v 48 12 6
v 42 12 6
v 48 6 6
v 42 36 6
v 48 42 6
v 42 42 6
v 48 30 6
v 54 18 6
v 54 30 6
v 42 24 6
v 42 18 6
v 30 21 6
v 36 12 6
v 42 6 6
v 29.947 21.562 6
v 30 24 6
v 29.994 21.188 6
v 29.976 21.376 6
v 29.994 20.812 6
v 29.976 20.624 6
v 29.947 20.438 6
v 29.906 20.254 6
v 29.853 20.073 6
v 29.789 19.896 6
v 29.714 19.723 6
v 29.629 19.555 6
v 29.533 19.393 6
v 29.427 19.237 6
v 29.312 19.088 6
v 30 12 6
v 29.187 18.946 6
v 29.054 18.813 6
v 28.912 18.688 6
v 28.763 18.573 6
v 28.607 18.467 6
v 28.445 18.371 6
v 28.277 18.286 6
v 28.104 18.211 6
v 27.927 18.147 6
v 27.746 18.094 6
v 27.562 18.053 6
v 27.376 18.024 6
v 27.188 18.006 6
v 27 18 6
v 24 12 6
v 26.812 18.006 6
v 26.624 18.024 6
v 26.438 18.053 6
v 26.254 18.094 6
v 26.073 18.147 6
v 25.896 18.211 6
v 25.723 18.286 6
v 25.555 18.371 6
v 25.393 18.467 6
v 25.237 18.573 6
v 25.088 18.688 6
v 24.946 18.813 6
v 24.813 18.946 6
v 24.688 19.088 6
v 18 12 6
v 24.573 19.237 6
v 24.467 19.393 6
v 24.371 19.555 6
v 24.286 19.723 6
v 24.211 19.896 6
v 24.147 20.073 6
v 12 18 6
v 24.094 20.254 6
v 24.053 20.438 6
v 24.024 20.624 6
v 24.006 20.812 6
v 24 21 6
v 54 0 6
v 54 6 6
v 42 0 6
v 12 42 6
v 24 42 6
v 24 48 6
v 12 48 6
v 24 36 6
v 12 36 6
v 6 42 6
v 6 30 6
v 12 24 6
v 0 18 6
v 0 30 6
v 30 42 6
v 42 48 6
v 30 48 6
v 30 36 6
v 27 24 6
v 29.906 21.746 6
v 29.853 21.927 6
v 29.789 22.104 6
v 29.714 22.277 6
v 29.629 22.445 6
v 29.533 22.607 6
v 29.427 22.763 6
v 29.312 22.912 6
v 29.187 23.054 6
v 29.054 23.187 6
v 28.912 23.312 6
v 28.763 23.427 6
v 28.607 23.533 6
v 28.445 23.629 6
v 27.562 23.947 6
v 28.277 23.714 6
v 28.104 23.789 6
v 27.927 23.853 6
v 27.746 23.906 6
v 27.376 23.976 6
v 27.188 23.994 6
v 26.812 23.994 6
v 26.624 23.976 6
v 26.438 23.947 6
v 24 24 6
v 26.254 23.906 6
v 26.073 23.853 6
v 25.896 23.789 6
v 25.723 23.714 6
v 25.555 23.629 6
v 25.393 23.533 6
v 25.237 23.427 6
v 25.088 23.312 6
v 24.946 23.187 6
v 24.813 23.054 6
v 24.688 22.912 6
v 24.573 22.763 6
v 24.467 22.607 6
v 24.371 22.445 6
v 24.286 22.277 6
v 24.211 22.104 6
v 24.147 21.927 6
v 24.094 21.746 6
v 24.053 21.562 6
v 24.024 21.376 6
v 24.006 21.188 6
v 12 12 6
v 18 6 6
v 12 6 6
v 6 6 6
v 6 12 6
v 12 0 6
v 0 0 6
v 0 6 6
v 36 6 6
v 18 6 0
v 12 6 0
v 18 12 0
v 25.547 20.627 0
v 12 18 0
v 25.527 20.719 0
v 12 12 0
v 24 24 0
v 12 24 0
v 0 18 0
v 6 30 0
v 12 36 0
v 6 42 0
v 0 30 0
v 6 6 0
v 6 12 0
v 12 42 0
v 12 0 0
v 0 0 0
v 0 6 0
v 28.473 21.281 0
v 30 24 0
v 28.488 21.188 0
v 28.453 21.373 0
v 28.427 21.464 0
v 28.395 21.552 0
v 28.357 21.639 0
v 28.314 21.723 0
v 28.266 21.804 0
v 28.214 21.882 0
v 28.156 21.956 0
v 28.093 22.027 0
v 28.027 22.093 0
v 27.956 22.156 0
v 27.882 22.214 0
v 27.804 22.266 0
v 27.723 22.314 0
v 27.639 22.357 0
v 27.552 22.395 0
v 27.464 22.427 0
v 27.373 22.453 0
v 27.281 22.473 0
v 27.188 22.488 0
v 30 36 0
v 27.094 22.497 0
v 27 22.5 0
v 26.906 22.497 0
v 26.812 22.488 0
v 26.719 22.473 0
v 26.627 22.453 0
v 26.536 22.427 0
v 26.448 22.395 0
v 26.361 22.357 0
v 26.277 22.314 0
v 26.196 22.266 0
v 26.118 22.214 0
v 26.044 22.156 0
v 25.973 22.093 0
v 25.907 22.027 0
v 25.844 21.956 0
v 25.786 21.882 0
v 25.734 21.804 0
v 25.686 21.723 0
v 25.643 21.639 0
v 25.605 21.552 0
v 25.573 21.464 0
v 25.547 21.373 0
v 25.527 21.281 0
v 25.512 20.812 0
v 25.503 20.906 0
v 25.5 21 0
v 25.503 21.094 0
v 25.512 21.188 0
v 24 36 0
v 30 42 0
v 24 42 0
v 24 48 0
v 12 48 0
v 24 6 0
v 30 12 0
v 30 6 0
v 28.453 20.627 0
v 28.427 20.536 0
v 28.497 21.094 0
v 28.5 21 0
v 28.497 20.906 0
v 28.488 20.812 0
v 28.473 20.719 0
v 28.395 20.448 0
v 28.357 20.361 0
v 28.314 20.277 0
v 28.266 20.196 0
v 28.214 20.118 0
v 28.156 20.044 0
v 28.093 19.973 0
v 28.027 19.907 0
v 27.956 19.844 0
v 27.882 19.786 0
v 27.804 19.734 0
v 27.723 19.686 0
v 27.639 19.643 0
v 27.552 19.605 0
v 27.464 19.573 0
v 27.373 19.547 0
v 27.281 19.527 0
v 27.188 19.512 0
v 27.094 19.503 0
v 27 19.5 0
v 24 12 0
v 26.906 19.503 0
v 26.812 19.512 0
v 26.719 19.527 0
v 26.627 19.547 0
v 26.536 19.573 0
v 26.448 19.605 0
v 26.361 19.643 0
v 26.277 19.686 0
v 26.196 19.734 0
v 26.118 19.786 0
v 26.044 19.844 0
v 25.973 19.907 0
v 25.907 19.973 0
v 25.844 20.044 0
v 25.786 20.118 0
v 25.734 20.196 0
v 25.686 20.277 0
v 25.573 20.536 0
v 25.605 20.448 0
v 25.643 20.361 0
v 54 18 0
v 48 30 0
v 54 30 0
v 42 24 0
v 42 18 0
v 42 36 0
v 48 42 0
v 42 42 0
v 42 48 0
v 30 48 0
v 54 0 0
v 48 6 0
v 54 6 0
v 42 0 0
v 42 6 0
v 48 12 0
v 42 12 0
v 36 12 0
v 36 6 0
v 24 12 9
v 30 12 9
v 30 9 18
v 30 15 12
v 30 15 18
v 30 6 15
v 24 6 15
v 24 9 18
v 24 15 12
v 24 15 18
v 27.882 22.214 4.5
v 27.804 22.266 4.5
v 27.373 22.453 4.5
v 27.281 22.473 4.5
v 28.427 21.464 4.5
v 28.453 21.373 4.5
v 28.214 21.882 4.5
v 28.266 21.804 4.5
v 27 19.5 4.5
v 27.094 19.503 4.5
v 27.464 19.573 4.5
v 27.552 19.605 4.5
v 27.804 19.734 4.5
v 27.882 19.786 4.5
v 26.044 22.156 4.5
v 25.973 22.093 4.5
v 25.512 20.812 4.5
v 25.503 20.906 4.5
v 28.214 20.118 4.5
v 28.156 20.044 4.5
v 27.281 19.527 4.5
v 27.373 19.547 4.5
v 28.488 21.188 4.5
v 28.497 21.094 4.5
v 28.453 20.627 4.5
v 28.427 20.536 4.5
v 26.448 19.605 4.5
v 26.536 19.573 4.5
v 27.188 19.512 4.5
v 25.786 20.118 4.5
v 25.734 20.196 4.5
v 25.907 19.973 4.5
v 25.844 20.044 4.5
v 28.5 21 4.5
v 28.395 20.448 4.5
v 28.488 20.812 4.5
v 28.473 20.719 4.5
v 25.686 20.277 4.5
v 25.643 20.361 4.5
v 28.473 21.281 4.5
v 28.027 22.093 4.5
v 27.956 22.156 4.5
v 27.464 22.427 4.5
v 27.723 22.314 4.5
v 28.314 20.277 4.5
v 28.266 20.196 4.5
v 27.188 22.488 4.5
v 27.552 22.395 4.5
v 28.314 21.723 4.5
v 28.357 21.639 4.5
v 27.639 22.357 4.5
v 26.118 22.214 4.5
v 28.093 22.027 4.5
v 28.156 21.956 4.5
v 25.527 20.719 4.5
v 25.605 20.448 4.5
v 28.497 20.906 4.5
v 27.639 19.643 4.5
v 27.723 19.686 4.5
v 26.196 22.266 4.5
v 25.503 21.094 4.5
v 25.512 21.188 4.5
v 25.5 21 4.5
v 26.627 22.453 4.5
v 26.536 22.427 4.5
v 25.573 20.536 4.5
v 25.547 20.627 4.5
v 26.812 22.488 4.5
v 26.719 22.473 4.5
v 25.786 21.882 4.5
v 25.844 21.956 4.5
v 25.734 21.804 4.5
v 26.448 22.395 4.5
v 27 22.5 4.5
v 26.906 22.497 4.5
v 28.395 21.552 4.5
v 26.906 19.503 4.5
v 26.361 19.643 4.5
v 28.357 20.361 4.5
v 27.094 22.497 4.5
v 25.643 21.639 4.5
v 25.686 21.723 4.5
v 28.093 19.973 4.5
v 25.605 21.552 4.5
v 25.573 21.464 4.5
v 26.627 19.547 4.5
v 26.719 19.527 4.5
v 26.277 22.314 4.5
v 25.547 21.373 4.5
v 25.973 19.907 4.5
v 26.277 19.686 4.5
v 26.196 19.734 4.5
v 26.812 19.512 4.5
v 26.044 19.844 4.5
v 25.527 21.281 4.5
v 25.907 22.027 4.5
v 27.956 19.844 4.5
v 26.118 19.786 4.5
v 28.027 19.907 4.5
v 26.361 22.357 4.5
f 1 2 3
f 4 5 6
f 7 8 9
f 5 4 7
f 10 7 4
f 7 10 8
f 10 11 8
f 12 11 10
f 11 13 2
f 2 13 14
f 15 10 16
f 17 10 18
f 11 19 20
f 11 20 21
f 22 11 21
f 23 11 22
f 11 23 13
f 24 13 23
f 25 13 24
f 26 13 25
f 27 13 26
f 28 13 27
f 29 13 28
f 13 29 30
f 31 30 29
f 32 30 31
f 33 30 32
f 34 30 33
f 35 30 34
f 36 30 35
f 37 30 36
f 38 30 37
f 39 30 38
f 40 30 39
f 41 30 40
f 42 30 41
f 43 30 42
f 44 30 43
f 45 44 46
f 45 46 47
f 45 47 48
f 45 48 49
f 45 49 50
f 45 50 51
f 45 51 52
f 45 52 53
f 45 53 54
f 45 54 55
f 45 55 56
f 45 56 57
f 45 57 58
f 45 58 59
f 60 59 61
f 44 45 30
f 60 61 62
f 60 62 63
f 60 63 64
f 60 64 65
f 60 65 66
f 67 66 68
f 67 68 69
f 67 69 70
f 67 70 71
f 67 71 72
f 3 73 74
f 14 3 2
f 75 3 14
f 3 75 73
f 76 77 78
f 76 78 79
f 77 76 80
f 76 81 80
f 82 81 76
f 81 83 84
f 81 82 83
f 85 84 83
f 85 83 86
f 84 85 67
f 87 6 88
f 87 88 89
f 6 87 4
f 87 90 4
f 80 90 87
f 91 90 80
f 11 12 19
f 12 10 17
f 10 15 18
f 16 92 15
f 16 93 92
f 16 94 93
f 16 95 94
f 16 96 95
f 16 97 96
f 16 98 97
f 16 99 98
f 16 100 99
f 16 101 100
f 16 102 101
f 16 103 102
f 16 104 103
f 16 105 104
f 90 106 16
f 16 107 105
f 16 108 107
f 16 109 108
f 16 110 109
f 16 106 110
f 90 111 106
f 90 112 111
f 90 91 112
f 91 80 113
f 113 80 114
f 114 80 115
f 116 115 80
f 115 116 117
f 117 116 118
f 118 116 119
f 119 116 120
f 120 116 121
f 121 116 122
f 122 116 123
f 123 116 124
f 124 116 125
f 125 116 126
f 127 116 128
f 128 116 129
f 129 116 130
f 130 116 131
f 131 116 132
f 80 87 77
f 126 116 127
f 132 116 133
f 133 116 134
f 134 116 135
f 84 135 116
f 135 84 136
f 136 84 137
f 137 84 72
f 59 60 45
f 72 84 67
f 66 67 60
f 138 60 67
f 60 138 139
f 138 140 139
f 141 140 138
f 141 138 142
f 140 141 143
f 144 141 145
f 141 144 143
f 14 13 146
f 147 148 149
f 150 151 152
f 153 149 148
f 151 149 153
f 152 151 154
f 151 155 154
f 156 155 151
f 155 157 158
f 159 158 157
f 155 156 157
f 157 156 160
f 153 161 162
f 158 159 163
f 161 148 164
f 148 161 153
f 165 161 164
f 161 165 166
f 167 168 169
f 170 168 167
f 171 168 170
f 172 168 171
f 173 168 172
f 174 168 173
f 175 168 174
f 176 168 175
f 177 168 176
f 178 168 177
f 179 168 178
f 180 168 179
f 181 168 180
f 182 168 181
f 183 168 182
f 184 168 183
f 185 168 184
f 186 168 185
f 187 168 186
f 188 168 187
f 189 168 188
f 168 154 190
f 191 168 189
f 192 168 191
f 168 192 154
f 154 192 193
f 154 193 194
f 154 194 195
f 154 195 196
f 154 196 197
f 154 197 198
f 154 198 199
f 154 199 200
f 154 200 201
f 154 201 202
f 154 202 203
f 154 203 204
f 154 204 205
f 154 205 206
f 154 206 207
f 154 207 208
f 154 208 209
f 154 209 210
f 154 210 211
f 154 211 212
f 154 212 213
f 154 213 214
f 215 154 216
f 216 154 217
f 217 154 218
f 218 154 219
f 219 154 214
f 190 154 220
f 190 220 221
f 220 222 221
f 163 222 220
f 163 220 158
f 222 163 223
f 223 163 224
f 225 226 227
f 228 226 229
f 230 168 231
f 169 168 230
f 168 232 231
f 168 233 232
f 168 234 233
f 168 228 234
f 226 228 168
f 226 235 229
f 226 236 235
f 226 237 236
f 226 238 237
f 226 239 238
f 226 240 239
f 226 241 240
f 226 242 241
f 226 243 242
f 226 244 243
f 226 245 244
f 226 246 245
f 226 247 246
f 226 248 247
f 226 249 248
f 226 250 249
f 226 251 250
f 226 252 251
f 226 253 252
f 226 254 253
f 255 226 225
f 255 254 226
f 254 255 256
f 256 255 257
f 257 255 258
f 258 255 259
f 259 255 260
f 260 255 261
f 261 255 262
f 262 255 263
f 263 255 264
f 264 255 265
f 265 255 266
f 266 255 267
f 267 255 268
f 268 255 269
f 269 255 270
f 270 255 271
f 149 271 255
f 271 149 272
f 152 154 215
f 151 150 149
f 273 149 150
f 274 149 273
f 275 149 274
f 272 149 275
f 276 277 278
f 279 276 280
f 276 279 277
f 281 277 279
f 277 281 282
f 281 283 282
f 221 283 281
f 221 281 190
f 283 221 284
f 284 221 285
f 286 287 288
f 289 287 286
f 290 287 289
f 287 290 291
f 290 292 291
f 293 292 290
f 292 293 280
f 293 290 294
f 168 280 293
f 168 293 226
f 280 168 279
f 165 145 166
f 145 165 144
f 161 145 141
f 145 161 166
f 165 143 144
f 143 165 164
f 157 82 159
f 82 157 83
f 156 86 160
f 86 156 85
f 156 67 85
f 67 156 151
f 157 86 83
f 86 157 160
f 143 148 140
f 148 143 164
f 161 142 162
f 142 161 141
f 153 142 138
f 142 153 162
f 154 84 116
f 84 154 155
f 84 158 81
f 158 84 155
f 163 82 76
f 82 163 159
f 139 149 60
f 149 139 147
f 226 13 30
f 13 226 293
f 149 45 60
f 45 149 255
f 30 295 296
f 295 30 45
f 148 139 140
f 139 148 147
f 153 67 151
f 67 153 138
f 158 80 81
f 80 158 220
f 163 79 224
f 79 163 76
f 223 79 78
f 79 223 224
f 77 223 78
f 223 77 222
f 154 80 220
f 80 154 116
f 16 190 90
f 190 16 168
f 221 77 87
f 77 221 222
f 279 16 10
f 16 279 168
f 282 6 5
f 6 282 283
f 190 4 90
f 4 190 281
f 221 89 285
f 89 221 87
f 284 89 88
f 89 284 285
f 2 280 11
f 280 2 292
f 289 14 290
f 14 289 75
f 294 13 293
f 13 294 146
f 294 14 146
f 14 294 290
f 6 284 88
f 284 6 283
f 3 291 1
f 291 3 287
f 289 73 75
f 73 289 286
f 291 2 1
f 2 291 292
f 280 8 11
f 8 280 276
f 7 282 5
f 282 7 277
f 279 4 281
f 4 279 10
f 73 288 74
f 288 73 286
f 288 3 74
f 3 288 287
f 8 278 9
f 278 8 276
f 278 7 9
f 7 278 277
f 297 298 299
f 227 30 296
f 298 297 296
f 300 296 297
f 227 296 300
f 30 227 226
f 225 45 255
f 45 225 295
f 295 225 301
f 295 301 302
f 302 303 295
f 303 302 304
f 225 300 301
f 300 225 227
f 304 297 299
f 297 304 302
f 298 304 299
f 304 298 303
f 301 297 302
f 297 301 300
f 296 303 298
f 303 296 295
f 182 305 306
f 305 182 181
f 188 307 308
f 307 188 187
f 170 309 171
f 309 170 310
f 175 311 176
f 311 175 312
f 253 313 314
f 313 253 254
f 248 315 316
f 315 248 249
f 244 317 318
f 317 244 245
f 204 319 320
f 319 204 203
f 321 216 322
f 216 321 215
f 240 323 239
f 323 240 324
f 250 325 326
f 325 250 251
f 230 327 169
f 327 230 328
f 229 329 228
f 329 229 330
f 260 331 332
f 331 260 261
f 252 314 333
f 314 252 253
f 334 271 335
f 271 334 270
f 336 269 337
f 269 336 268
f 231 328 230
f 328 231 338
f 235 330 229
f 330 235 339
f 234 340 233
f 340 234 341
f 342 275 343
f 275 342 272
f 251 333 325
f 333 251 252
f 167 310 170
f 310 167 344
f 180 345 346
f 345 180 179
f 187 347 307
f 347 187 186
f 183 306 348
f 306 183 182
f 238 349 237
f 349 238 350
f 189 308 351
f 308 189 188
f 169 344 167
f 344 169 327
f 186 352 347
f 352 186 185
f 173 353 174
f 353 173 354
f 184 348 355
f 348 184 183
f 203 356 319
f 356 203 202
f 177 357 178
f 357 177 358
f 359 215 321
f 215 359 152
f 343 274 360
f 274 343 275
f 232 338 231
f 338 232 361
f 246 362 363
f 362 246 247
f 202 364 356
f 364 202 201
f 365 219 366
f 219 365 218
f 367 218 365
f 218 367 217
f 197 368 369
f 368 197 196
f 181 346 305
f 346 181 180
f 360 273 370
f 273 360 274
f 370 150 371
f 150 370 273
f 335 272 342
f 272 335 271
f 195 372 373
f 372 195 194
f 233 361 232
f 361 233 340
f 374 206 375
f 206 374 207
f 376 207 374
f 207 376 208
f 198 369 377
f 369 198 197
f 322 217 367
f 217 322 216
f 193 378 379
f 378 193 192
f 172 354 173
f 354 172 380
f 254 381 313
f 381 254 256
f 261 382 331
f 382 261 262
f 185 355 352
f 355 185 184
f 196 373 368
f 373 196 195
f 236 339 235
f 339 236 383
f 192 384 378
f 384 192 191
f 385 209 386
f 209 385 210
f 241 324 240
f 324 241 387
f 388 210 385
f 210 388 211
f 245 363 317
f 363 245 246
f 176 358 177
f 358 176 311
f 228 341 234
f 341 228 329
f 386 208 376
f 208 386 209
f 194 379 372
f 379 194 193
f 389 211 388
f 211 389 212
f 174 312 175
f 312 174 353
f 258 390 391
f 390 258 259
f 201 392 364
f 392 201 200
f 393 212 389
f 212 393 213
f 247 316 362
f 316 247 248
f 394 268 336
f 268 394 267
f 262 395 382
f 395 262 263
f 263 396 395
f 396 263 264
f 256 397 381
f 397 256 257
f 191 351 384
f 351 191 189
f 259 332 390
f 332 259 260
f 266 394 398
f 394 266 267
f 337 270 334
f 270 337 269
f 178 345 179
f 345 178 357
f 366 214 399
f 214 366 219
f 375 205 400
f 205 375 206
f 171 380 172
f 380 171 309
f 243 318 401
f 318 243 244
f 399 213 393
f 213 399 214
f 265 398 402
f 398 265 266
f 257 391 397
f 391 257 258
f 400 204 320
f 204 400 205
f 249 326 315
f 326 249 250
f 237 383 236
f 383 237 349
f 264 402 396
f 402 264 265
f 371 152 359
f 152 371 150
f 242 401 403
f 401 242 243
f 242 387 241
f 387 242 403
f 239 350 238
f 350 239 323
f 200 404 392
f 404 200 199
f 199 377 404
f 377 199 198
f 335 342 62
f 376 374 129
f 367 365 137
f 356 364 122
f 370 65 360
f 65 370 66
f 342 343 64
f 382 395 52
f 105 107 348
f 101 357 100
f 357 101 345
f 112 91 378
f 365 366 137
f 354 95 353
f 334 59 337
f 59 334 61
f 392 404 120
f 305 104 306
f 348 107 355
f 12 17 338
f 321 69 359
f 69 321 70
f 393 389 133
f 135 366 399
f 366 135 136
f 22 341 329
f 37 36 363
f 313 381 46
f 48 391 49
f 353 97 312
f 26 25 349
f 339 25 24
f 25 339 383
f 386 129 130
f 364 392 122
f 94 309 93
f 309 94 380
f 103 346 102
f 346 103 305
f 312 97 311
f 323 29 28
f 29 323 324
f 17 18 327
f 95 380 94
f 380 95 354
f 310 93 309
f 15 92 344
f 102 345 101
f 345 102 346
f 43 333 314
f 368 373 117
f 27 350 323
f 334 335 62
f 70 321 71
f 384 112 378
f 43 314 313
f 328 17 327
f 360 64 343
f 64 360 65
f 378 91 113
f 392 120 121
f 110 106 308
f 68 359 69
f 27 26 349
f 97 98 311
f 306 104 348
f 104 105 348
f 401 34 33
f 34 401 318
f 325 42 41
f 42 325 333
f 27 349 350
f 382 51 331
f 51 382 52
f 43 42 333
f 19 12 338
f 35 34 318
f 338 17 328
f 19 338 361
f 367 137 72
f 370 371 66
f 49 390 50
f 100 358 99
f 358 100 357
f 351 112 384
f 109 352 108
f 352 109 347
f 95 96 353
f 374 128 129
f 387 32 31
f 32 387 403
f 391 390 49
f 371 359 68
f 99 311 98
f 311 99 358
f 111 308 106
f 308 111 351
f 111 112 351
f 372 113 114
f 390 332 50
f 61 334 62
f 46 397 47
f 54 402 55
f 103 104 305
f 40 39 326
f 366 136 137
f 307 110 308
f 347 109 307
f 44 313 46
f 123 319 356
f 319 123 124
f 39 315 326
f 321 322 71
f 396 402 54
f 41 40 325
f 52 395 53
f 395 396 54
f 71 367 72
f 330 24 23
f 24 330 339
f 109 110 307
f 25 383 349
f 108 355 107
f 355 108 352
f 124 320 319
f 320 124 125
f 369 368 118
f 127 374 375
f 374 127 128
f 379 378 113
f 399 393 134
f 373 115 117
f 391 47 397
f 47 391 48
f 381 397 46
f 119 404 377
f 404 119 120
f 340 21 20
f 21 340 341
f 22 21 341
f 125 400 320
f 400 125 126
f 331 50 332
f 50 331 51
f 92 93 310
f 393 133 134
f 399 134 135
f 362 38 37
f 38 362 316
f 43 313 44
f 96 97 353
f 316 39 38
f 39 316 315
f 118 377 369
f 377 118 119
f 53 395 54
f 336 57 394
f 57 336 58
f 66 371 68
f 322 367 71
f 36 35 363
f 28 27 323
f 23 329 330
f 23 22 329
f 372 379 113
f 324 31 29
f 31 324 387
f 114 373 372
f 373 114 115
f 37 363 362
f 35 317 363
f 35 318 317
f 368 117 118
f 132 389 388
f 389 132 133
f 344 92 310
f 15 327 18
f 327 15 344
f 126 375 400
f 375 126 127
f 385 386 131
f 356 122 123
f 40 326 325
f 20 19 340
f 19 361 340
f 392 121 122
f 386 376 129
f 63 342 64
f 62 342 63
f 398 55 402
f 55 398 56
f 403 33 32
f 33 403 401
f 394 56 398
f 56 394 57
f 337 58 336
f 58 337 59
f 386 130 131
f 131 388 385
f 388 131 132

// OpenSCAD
/* 
 * 
 *
 */

$fn=100;

// ------------------------------------------------------------------
// --- parameter ----------------------------------------------------
// ------------------------------------------------------------------

// resolution
$fn=100;

// edge length of one cube that builds the space invader
edgeLength=6;

// radius of the holes
wholeRadius=1.5;


// ------------------------------------------------------------------
// --- space invader versions ---------------------------------------
// --- a vector of 2d coordinates -----------------------------------
// ------------------------------------------------------------------

sp1=[[0,0],[0,1],[0,2],[1,2],[1,3],[1,4],[2,1],[2,2],[2,4],[2,5],[3,2],[3,3],[3,4],[4,1],[4,2],[4,4],[4,5],[5,2],[5,3],[5,4],[6,0],[6,1],[6,2]];

sp2=[[0,0],[0,1],[0,2],[1,2],[1,3],[1,4],[2,1],[2,2],[2,4],[2,5],[3,-1],[3,0],[3,1],[3,2],[3,3],[3,4],[4,1],[4,2],[4,4],[4,5],[5,2],[5,3],[5,4],[6,0],[6,1],[6,2]];

sp3=[[0,-1],[0,0],[0,1],[0,2],[1,-1],[1,2],[1,3],[1,4],[2,1],[2,2],[2,4],[2,5],[3,-1],[3,0],[3,1],[3,2],[3,3],[3,4],[4,1],[4,2],[4,4],[4,5],[5,-1],[5,2],[5,3],[5,4],[6,-1],[6,0],[6,1],[6,2]];

sp4=[[0,0],[0,3],[0,4],[1,0],[1,1],[1,3],[1,4],[1,5],[1,6],[2,1],[2,2],[2,3],[2,6],[2,7],[3,2],[3,3],[3,6],[3,7],[4,2],[4,3],[4,4],[4,5],[4,6],[5,2],[5,3],[5,6],[5,7],[6,1],[6,2],[6,3],[6,6],[6,7],[7,0],[7,1],[7,3],[7,4],[7,5],[7,6],[8,0],[8,3],[8,4]];


// ------------------------------------------------------------------
// --- programm -----------------------------------------------------
// ------------------------------------------------------------------

invader4();


// ------------------------------------------------------------------
// --- invader modules ----------------------------------------------
// ------------------------------------------------------------------


module invader1() {
	_invader(sp1, [3,2], [3,4]);
}

module invader2() {
	_invader(sp2, [3,-1], [3,2]);
}

module invader3() {
	_invader(sp3, [3,-1], [3,2]);
}

module invader4() {
	_invader(sp4, [4,1], [4,3]);
}




// ------------------------------------------------------------------
// --- modules ------------------------------------------------------
// ------------------------------------------------------------------


// builds a complete towel holder with space invader base, 
// holes and noses.

module _invader(data, nose, hole) {
	difference() {
		union() {
			for (i = [0:len(data)]) {
				_cube(data[i][0], data[i][1], 0);
			}
			_holder(nose[0], nose[1]);
		}
		translate([hole[0]*edgeLength+edgeLength/2, hole[1]*edgeLength+edgeLength/2, 0]) {
			cylinder(h=edgeLength, r=1.5);
			hull() {
				translate([0, 0, edgeLength-1.5]) cylinder(h=0.1, r=1.5);
				translate([0, 0, edgeLength]) cylinder(h=0.1, r=3);
			}
			//translate([0, 0, 1.3*edgeLength]) sphere(r=3);
		}
	}
}

module _cube(x, y) {
	translate([x*edgeLength, y*edgeLength, 0]) {
		cube([edgeLength, edgeLength, edgeLength]);
	}
}

module _holder(x, y) {
	translate([x*edgeLength, y*edgeLength, 0]) {
		union() {
			cube([edgeLength, edgeLength, edgeLength]);
			translate([0, 0, edgeLength]) {
				cube([edgeLength, edgeLength, edgeLength]);
			}
			hull() {
				translate([0, 0, 1.5*edgeLength]) {
					cube([edgeLength, edgeLength, edgeLength]);
				}
				translate([0, 0.5*edgeLength, 2*edgeLength]) {
					cube([edgeLength, edgeLength, edgeLength]);
				}
			}
		}
	}
}



// ------------------------------------------------------------------
// --- trash --------------------------------------------------------
// ------------------------------------------------------------------
